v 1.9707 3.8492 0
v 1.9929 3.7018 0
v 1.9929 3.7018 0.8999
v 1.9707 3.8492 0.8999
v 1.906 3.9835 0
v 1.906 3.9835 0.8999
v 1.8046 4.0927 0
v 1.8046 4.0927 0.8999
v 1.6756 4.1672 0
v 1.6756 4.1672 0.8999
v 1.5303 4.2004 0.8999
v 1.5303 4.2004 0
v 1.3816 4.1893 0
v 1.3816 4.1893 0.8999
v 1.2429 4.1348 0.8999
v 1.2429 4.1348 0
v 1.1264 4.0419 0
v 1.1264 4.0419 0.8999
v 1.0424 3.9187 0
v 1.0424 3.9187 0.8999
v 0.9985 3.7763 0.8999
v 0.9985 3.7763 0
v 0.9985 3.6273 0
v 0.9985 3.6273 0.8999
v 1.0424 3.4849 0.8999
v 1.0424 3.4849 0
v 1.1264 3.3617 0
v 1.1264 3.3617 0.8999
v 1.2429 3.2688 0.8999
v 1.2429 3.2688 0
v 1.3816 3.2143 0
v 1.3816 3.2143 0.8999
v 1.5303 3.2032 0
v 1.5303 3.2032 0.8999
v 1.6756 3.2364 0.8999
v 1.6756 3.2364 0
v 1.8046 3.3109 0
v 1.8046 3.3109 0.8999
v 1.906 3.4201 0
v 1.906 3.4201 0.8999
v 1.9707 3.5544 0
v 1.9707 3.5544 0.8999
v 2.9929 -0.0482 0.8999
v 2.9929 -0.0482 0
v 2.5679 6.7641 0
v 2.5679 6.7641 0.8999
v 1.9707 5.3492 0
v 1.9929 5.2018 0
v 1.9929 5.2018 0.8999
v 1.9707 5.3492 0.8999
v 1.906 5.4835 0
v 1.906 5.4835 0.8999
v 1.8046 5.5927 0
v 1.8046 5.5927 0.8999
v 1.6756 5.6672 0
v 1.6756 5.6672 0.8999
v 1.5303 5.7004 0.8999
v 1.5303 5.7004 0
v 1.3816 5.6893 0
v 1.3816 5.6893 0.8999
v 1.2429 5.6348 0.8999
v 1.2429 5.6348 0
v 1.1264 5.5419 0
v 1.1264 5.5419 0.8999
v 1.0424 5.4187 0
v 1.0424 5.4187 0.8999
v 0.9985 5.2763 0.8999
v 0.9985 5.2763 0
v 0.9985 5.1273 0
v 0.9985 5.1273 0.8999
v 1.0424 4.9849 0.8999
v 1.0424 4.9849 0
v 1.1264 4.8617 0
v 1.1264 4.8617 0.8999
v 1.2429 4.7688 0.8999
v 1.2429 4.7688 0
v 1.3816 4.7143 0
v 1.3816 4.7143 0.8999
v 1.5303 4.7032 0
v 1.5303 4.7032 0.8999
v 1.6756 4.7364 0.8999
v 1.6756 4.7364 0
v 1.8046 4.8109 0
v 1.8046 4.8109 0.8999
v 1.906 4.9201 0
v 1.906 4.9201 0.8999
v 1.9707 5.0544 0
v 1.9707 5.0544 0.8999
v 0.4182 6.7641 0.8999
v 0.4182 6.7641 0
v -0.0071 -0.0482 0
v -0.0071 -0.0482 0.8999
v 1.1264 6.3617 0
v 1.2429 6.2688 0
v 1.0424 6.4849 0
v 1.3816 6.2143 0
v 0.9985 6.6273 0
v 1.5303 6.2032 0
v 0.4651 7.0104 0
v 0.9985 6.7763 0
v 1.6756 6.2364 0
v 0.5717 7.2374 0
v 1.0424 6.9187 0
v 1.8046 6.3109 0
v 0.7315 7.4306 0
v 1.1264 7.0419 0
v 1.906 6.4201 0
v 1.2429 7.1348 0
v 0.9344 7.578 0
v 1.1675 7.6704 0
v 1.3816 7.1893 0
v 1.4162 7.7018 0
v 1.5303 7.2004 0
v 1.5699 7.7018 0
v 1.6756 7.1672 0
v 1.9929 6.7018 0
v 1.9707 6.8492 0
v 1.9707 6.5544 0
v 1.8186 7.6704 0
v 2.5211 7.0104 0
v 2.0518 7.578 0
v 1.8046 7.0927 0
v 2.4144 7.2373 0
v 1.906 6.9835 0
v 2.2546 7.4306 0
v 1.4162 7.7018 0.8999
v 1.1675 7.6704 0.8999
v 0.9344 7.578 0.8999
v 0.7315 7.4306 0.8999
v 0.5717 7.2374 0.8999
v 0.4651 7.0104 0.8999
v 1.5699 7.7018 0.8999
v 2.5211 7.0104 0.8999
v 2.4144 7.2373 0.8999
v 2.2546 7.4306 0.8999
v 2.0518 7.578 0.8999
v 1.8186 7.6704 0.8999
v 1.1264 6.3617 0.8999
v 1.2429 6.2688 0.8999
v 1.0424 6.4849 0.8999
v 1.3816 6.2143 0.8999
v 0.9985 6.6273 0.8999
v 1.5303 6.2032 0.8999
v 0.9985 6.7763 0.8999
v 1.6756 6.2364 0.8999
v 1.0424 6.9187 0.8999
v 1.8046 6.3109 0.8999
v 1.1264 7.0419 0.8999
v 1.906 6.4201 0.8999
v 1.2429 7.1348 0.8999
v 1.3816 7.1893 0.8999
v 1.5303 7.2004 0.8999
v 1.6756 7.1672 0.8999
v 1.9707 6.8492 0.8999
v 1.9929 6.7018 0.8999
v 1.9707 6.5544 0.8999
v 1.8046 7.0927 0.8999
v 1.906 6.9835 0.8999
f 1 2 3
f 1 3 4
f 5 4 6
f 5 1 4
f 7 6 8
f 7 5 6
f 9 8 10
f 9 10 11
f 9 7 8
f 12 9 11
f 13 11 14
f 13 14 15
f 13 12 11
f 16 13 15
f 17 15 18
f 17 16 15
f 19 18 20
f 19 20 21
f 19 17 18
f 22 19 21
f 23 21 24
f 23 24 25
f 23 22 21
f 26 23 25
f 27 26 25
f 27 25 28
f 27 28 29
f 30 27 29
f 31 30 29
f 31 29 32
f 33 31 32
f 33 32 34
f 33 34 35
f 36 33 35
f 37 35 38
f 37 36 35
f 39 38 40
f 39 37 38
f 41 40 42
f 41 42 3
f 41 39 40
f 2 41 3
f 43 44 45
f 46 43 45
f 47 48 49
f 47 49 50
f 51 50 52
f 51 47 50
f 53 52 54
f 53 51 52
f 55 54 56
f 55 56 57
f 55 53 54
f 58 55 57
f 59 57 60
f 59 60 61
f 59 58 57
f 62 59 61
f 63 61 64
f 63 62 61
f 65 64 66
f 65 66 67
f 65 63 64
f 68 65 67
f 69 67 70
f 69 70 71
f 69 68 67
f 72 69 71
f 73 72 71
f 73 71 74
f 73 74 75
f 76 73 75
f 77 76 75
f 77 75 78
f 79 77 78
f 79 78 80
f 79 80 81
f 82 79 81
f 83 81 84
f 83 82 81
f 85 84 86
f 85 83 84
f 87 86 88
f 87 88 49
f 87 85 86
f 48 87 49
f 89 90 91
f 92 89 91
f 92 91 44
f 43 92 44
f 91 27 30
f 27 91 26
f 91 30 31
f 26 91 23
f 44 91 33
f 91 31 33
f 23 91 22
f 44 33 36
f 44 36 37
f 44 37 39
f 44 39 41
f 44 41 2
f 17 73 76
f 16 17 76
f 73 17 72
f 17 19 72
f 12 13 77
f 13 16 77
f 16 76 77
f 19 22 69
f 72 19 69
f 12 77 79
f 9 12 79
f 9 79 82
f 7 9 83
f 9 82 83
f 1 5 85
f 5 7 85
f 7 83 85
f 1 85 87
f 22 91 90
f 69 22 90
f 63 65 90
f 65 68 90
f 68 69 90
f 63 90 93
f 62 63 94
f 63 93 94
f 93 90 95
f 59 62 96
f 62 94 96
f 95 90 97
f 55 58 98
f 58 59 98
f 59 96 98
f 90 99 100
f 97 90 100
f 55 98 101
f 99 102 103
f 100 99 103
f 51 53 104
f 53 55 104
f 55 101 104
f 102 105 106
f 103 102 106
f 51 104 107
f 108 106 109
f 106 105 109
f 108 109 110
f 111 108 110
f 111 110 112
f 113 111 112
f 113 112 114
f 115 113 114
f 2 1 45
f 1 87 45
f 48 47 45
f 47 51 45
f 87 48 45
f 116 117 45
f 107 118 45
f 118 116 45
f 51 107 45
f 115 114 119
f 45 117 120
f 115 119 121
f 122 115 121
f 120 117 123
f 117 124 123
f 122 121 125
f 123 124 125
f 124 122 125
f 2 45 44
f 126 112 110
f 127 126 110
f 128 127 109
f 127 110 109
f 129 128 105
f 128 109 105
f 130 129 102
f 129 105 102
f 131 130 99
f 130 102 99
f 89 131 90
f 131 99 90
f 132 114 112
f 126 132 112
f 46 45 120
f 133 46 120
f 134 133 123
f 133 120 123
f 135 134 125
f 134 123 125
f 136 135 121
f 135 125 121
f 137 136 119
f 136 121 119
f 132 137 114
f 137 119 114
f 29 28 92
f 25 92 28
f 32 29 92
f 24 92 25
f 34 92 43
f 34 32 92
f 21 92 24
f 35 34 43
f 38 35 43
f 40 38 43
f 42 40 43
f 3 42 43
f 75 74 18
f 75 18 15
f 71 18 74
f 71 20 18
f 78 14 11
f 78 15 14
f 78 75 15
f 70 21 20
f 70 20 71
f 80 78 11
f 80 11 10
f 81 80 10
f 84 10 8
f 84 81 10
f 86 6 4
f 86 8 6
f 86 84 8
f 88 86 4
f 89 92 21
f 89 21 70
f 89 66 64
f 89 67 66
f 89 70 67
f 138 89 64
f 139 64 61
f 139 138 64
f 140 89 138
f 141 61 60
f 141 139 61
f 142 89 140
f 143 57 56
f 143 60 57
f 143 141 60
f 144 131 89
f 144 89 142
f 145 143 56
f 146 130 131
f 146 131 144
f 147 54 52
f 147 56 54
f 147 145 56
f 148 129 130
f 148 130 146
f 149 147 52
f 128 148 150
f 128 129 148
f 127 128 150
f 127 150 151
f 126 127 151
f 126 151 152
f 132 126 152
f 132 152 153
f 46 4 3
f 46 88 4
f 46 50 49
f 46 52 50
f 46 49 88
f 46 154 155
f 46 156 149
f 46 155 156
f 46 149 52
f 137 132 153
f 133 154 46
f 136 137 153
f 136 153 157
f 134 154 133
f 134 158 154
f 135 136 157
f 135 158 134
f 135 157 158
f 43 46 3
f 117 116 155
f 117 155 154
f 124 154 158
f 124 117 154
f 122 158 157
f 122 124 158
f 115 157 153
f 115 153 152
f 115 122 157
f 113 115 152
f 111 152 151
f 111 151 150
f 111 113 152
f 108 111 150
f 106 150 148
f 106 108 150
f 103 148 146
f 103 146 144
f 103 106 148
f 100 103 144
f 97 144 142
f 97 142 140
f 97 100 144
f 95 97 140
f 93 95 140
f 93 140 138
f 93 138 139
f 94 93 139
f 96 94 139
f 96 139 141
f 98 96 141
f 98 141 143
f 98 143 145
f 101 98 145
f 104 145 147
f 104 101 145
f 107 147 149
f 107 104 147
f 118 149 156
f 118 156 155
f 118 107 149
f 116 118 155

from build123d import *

# Parameters (mm, degrees)
SKETCH1_R           = 0.5
BOSS_EXTRUDE1_DEPTH = 0.899922


with BuildPart() as part:
    # Sketch1 → Boss-Extrude1 (new body)
    with BuildSketch(Plane.XY):
        with BuildLine():
            Line((1.569871125, 7.70179743), (1.41624751, 7.70179743))
            ThreePointArc((1.41624751, 7.70179743), (0.731524296, 7.430600641), (0.418190556, 6.764105671))
            Line((0.418190556, 6.764105671), (-0.007098742, -0.04820257))
            Line((-0.007098742, -0.04820257), (2.992901258, -0.04820257))
            Line((2.992901258, -0.04820257), (2.567930958, 6.764059536))
            ThreePointArc((2.567930958, 6.764059536), (2.254611183, 7.430584816), (1.569871125, 7.70179743))
        make_face()
        with Locations((1.492901258, 3.70179743)):
            Circle(SKETCH1_R, mode=Mode.SUBTRACT)
        with Locations((1.492901258, 5.20179743)):
            Circle(SKETCH1_R, mode=Mode.SUBTRACT)
        with Locations((1.492901258, 6.70179743)):
            Circle(SKETCH1_R, mode=Mode.SUBTRACT)
    extrude(amount=BOSS_EXTRUDE1_DEPTH)


solid = part.part
